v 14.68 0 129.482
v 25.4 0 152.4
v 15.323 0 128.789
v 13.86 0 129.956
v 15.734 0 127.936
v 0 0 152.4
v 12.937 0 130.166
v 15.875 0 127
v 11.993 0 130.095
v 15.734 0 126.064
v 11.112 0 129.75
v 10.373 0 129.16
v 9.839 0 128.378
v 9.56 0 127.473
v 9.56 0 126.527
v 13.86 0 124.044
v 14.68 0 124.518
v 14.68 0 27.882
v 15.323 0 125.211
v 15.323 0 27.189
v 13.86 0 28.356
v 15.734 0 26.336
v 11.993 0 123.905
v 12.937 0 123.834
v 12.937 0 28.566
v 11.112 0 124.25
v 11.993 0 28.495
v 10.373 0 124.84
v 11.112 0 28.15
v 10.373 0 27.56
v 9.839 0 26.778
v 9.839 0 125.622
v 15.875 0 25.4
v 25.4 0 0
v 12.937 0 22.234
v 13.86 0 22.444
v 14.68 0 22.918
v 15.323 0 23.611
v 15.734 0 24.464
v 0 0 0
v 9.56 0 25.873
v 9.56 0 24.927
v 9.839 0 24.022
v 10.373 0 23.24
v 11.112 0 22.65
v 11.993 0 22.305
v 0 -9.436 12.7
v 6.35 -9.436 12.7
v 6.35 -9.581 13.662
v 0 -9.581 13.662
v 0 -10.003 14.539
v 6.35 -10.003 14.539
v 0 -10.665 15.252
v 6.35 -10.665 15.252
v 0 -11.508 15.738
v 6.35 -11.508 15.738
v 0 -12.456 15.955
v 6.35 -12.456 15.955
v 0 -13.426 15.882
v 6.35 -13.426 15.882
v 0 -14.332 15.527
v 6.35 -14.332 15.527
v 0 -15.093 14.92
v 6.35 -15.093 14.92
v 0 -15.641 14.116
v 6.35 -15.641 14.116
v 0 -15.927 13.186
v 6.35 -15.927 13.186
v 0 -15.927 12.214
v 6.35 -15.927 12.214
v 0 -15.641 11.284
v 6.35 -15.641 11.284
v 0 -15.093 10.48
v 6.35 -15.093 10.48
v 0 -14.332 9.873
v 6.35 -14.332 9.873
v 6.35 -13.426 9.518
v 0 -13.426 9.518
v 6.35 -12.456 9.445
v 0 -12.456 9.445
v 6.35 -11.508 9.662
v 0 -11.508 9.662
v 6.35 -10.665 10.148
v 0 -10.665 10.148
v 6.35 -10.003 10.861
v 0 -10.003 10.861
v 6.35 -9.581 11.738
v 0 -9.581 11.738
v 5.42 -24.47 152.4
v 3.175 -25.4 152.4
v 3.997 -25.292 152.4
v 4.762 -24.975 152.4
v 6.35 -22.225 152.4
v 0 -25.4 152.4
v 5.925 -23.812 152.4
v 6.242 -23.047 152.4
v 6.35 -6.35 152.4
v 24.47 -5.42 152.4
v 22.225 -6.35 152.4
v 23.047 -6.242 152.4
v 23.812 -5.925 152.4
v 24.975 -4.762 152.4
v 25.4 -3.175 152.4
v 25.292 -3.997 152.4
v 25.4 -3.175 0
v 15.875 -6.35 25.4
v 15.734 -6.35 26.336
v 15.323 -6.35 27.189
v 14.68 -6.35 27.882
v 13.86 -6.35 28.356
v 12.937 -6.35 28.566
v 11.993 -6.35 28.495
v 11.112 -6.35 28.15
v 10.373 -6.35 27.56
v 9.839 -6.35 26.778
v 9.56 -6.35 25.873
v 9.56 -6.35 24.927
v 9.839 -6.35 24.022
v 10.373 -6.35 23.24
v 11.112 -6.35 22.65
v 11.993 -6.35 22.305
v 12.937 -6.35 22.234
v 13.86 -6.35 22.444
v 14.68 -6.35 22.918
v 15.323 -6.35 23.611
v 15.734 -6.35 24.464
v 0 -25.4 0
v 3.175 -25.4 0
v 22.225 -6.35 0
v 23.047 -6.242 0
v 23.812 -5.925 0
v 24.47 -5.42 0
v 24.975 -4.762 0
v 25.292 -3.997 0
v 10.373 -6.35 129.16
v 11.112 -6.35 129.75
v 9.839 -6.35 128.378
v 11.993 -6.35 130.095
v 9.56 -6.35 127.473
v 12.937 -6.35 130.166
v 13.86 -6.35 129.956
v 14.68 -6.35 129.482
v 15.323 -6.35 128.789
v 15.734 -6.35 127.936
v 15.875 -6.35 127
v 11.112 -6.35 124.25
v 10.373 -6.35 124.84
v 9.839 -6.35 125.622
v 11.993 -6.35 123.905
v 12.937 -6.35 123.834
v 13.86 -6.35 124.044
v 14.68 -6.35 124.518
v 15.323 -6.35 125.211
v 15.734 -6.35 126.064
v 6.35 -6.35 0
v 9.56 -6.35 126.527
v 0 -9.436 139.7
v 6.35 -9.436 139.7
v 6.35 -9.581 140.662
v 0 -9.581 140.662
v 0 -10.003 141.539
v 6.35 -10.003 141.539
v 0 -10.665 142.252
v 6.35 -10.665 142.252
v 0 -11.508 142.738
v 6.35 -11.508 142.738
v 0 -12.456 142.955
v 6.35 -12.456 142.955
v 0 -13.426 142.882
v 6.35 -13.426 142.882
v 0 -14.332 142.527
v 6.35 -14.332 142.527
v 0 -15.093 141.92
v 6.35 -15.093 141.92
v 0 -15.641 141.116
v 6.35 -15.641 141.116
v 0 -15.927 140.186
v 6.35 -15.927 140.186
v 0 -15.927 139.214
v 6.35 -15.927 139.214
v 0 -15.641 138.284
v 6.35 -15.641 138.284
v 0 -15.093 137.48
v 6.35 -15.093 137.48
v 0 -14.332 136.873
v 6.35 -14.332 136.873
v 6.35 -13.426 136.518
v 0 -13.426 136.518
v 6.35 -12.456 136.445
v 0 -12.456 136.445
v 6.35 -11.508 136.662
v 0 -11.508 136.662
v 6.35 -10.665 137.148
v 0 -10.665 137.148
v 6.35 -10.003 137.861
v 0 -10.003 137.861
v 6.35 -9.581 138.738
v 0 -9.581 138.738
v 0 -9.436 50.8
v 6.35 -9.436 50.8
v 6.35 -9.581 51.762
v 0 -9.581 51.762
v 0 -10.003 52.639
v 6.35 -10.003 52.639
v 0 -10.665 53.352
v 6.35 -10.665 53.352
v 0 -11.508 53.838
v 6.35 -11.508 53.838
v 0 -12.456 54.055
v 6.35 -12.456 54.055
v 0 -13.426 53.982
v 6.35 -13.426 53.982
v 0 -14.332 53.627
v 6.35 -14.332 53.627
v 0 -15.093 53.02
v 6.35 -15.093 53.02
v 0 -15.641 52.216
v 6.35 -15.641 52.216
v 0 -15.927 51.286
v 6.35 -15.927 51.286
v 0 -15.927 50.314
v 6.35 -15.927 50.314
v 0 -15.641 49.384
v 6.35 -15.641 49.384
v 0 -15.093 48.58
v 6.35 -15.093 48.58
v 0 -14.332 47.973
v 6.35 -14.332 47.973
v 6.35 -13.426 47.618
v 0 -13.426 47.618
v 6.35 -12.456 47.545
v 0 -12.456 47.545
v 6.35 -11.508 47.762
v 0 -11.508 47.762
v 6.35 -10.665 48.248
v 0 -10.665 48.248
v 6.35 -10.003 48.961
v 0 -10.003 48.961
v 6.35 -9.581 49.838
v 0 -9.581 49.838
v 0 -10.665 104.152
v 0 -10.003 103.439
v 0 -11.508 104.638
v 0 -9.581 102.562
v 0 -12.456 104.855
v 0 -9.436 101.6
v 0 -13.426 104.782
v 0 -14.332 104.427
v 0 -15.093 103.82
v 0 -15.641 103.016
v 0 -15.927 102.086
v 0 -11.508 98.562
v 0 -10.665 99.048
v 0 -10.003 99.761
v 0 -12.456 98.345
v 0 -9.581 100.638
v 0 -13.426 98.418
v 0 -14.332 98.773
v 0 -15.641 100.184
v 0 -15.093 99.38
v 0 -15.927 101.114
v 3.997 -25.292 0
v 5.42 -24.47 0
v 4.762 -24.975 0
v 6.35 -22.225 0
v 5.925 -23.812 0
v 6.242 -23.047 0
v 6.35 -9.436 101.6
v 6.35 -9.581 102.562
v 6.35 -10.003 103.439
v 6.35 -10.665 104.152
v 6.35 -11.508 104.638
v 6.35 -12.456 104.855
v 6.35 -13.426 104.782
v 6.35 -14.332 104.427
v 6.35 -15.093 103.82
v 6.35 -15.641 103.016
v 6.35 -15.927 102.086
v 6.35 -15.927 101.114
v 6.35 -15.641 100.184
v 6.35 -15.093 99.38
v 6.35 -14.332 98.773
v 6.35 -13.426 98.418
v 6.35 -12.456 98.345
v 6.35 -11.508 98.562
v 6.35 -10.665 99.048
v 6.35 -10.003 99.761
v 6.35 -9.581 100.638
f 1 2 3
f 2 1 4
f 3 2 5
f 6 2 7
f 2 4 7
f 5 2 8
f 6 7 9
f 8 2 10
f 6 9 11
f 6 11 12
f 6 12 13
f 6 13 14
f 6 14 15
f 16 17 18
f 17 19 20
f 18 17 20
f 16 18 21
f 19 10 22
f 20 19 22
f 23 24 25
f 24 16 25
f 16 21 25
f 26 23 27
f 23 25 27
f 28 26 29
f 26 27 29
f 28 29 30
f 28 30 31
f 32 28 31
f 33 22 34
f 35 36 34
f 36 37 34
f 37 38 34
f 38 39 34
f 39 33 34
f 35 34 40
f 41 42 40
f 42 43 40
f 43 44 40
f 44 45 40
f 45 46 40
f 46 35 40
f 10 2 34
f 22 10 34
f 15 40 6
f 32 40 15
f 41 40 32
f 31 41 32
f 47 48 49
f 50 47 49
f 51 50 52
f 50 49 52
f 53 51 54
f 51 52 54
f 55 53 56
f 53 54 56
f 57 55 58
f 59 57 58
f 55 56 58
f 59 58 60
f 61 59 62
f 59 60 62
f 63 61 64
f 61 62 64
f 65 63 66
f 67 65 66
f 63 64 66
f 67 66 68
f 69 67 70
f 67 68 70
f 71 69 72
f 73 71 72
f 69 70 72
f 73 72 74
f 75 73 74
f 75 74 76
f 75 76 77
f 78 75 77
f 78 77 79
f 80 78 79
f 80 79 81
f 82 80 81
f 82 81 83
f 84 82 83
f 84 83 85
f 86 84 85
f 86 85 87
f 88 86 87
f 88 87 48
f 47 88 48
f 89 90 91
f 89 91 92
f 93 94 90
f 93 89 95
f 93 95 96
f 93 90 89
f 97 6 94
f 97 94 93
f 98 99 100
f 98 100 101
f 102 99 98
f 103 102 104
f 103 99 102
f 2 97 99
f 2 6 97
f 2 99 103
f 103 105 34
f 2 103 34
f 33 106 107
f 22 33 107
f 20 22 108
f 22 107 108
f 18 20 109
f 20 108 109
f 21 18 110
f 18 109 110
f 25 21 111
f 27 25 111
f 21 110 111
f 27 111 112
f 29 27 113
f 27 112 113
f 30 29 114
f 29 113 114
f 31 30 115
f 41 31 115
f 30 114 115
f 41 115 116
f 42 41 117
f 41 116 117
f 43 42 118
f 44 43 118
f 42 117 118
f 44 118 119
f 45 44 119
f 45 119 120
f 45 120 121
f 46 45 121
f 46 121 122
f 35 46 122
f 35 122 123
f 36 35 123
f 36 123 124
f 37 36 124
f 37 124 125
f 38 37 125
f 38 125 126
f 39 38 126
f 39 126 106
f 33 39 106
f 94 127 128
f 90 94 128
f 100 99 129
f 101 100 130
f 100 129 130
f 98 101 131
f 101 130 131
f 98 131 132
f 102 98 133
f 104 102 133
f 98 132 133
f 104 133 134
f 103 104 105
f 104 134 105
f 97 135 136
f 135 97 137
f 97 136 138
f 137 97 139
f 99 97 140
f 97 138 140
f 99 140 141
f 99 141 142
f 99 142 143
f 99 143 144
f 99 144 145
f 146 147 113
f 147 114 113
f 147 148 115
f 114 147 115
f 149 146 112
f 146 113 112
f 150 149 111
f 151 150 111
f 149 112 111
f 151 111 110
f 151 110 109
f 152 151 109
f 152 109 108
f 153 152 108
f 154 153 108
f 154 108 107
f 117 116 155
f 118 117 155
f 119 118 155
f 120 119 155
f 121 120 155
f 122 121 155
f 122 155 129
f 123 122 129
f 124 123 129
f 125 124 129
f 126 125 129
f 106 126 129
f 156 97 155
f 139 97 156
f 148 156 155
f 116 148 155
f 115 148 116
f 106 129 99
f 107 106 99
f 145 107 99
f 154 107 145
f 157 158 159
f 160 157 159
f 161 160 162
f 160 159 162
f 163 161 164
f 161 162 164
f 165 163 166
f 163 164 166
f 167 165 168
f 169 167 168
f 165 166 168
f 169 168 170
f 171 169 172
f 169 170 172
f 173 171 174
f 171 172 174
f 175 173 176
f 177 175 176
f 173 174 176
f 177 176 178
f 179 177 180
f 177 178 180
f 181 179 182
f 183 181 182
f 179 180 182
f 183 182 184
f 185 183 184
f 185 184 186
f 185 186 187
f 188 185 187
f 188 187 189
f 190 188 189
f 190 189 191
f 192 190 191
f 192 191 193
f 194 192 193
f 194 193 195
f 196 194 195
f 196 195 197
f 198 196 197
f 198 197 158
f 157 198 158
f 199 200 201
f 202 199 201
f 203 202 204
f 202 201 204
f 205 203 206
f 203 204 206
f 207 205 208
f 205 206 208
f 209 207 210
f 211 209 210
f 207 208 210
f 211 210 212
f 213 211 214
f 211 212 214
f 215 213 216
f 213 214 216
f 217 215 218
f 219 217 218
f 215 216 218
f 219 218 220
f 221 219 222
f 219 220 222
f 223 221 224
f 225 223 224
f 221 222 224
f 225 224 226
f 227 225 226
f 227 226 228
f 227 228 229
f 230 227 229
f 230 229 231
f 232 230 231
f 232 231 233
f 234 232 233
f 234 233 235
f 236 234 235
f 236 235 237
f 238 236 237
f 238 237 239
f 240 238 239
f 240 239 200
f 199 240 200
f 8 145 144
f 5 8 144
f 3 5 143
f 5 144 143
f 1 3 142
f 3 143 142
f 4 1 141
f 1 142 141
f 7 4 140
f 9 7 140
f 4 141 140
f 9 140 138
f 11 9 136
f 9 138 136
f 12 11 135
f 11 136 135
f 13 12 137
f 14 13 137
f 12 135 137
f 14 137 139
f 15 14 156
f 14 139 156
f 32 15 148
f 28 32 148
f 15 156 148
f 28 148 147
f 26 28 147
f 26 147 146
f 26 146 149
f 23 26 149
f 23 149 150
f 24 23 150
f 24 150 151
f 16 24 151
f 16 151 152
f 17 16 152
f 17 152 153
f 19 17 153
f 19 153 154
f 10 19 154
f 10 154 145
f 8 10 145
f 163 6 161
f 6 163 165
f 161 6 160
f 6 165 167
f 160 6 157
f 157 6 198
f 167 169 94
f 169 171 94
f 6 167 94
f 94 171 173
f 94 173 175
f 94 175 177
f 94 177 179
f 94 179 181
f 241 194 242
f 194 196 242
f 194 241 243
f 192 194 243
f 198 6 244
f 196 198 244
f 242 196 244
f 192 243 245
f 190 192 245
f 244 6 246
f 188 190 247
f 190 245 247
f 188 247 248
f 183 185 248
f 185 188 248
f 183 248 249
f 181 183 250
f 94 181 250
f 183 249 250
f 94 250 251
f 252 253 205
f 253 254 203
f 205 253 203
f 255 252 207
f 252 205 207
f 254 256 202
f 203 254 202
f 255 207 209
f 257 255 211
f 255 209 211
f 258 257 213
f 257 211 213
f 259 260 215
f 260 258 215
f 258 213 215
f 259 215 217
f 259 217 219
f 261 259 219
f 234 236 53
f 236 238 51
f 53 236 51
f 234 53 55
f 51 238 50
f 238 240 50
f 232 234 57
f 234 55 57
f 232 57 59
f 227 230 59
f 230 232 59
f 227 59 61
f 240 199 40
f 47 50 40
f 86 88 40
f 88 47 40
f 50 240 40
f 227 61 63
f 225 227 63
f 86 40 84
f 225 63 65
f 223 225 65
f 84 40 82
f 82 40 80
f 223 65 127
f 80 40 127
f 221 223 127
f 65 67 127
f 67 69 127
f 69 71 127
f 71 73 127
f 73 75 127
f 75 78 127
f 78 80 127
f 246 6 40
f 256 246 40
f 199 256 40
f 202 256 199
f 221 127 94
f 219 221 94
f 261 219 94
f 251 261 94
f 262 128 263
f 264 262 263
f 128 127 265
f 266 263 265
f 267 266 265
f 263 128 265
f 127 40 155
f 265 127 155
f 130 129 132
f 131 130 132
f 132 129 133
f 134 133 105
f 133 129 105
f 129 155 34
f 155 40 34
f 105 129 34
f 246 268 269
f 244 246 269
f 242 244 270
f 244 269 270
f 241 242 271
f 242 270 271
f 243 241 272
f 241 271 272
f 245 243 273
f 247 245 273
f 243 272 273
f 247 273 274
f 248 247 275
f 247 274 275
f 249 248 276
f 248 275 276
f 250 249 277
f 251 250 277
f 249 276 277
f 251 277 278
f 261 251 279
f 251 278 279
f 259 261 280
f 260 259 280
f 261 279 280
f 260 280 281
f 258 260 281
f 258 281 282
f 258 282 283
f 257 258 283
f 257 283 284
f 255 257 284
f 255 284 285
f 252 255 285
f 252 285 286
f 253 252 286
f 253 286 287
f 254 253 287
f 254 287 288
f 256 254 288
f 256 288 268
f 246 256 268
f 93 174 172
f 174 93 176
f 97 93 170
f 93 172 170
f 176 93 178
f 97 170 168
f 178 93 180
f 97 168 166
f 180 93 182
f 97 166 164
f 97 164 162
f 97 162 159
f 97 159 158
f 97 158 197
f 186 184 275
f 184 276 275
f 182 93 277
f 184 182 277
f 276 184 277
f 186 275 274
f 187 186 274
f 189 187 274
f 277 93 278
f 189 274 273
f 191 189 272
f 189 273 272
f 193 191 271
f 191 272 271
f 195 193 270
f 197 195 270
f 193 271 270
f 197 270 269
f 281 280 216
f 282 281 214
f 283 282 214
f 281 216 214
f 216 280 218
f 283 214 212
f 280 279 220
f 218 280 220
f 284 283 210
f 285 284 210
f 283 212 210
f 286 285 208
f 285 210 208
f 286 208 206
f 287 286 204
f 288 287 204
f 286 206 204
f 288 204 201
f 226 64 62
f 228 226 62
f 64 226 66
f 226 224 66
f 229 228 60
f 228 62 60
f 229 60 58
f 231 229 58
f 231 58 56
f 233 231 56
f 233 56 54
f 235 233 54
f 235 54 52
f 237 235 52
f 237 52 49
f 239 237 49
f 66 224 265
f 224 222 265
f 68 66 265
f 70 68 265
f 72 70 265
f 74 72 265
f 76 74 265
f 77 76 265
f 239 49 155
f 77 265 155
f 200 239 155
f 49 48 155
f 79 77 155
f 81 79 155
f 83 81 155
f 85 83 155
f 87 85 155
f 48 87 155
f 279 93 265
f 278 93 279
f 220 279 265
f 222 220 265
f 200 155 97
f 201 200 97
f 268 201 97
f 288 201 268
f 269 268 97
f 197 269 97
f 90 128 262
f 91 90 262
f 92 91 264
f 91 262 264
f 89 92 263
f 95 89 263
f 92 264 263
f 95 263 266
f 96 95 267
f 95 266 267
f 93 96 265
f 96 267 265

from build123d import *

# Parameters (mm, degrees)
F1_DEPTH = 152.4
F4_D     = 6.35
F4_DEPTH = 25.4
F5_D     = 6.5278
F5_DEPTH = 25.4


with BuildPart() as f1:
    # F0 (on Top) → F1 (new body)
    with BuildSketch(Plane.XY):
        with BuildLine():
            Line((25.4, 0), (0, 0))
            Line((0, 0), (0, -25.4))
            Line((0, -25.4), (3.175, -25.4))
            ThreePointArc((3.175, -25.4), (5.420064, -24.470064), (6.35, -22.225))
            Line((6.35, -22.225), (6.35, -19.05))
            Line((6.35, -19.05), (6.35, -6.35))
            Line((6.35, -6.35), (18.926421, -6.35))
            Line((18.926421, -6.35), (19.173579, -6.35))
            Line((19.173579, -6.35), (22.225, -6.35))
            ThreePointArc((22.225, -6.35), (24.470064, -5.420064), (25.4, -3.175))
            Line((25.4, -3.175), (25.4, -0.001203))
            Line((25.4, -0.001203), (25.4, 0))
        make_face()
    extrude(amount=F1_DEPTH)

    # F4
    with Locations(Plane(origin=(0, 0, 0), x_dir=(-1, 0, 0), z_dir=(0, 1, 0))):
        with Locations((-12.7, 127), (-12.7, 25.4)):
            Hole(F4_D / 2, depth=F4_DEPTH)

    # F5
    with Locations(Plane(origin=(0, 0, 0), x_dir=(0, -1, 0), z_dir=(-1, 0, 0))):
        with Locations((12.7, 12.7), (12.7, 50.8), (12.7, 101.6), (12.7, 139.7)):
            Hole(F5_D / 2, depth=F5_DEPTH)


solid = f1.part
